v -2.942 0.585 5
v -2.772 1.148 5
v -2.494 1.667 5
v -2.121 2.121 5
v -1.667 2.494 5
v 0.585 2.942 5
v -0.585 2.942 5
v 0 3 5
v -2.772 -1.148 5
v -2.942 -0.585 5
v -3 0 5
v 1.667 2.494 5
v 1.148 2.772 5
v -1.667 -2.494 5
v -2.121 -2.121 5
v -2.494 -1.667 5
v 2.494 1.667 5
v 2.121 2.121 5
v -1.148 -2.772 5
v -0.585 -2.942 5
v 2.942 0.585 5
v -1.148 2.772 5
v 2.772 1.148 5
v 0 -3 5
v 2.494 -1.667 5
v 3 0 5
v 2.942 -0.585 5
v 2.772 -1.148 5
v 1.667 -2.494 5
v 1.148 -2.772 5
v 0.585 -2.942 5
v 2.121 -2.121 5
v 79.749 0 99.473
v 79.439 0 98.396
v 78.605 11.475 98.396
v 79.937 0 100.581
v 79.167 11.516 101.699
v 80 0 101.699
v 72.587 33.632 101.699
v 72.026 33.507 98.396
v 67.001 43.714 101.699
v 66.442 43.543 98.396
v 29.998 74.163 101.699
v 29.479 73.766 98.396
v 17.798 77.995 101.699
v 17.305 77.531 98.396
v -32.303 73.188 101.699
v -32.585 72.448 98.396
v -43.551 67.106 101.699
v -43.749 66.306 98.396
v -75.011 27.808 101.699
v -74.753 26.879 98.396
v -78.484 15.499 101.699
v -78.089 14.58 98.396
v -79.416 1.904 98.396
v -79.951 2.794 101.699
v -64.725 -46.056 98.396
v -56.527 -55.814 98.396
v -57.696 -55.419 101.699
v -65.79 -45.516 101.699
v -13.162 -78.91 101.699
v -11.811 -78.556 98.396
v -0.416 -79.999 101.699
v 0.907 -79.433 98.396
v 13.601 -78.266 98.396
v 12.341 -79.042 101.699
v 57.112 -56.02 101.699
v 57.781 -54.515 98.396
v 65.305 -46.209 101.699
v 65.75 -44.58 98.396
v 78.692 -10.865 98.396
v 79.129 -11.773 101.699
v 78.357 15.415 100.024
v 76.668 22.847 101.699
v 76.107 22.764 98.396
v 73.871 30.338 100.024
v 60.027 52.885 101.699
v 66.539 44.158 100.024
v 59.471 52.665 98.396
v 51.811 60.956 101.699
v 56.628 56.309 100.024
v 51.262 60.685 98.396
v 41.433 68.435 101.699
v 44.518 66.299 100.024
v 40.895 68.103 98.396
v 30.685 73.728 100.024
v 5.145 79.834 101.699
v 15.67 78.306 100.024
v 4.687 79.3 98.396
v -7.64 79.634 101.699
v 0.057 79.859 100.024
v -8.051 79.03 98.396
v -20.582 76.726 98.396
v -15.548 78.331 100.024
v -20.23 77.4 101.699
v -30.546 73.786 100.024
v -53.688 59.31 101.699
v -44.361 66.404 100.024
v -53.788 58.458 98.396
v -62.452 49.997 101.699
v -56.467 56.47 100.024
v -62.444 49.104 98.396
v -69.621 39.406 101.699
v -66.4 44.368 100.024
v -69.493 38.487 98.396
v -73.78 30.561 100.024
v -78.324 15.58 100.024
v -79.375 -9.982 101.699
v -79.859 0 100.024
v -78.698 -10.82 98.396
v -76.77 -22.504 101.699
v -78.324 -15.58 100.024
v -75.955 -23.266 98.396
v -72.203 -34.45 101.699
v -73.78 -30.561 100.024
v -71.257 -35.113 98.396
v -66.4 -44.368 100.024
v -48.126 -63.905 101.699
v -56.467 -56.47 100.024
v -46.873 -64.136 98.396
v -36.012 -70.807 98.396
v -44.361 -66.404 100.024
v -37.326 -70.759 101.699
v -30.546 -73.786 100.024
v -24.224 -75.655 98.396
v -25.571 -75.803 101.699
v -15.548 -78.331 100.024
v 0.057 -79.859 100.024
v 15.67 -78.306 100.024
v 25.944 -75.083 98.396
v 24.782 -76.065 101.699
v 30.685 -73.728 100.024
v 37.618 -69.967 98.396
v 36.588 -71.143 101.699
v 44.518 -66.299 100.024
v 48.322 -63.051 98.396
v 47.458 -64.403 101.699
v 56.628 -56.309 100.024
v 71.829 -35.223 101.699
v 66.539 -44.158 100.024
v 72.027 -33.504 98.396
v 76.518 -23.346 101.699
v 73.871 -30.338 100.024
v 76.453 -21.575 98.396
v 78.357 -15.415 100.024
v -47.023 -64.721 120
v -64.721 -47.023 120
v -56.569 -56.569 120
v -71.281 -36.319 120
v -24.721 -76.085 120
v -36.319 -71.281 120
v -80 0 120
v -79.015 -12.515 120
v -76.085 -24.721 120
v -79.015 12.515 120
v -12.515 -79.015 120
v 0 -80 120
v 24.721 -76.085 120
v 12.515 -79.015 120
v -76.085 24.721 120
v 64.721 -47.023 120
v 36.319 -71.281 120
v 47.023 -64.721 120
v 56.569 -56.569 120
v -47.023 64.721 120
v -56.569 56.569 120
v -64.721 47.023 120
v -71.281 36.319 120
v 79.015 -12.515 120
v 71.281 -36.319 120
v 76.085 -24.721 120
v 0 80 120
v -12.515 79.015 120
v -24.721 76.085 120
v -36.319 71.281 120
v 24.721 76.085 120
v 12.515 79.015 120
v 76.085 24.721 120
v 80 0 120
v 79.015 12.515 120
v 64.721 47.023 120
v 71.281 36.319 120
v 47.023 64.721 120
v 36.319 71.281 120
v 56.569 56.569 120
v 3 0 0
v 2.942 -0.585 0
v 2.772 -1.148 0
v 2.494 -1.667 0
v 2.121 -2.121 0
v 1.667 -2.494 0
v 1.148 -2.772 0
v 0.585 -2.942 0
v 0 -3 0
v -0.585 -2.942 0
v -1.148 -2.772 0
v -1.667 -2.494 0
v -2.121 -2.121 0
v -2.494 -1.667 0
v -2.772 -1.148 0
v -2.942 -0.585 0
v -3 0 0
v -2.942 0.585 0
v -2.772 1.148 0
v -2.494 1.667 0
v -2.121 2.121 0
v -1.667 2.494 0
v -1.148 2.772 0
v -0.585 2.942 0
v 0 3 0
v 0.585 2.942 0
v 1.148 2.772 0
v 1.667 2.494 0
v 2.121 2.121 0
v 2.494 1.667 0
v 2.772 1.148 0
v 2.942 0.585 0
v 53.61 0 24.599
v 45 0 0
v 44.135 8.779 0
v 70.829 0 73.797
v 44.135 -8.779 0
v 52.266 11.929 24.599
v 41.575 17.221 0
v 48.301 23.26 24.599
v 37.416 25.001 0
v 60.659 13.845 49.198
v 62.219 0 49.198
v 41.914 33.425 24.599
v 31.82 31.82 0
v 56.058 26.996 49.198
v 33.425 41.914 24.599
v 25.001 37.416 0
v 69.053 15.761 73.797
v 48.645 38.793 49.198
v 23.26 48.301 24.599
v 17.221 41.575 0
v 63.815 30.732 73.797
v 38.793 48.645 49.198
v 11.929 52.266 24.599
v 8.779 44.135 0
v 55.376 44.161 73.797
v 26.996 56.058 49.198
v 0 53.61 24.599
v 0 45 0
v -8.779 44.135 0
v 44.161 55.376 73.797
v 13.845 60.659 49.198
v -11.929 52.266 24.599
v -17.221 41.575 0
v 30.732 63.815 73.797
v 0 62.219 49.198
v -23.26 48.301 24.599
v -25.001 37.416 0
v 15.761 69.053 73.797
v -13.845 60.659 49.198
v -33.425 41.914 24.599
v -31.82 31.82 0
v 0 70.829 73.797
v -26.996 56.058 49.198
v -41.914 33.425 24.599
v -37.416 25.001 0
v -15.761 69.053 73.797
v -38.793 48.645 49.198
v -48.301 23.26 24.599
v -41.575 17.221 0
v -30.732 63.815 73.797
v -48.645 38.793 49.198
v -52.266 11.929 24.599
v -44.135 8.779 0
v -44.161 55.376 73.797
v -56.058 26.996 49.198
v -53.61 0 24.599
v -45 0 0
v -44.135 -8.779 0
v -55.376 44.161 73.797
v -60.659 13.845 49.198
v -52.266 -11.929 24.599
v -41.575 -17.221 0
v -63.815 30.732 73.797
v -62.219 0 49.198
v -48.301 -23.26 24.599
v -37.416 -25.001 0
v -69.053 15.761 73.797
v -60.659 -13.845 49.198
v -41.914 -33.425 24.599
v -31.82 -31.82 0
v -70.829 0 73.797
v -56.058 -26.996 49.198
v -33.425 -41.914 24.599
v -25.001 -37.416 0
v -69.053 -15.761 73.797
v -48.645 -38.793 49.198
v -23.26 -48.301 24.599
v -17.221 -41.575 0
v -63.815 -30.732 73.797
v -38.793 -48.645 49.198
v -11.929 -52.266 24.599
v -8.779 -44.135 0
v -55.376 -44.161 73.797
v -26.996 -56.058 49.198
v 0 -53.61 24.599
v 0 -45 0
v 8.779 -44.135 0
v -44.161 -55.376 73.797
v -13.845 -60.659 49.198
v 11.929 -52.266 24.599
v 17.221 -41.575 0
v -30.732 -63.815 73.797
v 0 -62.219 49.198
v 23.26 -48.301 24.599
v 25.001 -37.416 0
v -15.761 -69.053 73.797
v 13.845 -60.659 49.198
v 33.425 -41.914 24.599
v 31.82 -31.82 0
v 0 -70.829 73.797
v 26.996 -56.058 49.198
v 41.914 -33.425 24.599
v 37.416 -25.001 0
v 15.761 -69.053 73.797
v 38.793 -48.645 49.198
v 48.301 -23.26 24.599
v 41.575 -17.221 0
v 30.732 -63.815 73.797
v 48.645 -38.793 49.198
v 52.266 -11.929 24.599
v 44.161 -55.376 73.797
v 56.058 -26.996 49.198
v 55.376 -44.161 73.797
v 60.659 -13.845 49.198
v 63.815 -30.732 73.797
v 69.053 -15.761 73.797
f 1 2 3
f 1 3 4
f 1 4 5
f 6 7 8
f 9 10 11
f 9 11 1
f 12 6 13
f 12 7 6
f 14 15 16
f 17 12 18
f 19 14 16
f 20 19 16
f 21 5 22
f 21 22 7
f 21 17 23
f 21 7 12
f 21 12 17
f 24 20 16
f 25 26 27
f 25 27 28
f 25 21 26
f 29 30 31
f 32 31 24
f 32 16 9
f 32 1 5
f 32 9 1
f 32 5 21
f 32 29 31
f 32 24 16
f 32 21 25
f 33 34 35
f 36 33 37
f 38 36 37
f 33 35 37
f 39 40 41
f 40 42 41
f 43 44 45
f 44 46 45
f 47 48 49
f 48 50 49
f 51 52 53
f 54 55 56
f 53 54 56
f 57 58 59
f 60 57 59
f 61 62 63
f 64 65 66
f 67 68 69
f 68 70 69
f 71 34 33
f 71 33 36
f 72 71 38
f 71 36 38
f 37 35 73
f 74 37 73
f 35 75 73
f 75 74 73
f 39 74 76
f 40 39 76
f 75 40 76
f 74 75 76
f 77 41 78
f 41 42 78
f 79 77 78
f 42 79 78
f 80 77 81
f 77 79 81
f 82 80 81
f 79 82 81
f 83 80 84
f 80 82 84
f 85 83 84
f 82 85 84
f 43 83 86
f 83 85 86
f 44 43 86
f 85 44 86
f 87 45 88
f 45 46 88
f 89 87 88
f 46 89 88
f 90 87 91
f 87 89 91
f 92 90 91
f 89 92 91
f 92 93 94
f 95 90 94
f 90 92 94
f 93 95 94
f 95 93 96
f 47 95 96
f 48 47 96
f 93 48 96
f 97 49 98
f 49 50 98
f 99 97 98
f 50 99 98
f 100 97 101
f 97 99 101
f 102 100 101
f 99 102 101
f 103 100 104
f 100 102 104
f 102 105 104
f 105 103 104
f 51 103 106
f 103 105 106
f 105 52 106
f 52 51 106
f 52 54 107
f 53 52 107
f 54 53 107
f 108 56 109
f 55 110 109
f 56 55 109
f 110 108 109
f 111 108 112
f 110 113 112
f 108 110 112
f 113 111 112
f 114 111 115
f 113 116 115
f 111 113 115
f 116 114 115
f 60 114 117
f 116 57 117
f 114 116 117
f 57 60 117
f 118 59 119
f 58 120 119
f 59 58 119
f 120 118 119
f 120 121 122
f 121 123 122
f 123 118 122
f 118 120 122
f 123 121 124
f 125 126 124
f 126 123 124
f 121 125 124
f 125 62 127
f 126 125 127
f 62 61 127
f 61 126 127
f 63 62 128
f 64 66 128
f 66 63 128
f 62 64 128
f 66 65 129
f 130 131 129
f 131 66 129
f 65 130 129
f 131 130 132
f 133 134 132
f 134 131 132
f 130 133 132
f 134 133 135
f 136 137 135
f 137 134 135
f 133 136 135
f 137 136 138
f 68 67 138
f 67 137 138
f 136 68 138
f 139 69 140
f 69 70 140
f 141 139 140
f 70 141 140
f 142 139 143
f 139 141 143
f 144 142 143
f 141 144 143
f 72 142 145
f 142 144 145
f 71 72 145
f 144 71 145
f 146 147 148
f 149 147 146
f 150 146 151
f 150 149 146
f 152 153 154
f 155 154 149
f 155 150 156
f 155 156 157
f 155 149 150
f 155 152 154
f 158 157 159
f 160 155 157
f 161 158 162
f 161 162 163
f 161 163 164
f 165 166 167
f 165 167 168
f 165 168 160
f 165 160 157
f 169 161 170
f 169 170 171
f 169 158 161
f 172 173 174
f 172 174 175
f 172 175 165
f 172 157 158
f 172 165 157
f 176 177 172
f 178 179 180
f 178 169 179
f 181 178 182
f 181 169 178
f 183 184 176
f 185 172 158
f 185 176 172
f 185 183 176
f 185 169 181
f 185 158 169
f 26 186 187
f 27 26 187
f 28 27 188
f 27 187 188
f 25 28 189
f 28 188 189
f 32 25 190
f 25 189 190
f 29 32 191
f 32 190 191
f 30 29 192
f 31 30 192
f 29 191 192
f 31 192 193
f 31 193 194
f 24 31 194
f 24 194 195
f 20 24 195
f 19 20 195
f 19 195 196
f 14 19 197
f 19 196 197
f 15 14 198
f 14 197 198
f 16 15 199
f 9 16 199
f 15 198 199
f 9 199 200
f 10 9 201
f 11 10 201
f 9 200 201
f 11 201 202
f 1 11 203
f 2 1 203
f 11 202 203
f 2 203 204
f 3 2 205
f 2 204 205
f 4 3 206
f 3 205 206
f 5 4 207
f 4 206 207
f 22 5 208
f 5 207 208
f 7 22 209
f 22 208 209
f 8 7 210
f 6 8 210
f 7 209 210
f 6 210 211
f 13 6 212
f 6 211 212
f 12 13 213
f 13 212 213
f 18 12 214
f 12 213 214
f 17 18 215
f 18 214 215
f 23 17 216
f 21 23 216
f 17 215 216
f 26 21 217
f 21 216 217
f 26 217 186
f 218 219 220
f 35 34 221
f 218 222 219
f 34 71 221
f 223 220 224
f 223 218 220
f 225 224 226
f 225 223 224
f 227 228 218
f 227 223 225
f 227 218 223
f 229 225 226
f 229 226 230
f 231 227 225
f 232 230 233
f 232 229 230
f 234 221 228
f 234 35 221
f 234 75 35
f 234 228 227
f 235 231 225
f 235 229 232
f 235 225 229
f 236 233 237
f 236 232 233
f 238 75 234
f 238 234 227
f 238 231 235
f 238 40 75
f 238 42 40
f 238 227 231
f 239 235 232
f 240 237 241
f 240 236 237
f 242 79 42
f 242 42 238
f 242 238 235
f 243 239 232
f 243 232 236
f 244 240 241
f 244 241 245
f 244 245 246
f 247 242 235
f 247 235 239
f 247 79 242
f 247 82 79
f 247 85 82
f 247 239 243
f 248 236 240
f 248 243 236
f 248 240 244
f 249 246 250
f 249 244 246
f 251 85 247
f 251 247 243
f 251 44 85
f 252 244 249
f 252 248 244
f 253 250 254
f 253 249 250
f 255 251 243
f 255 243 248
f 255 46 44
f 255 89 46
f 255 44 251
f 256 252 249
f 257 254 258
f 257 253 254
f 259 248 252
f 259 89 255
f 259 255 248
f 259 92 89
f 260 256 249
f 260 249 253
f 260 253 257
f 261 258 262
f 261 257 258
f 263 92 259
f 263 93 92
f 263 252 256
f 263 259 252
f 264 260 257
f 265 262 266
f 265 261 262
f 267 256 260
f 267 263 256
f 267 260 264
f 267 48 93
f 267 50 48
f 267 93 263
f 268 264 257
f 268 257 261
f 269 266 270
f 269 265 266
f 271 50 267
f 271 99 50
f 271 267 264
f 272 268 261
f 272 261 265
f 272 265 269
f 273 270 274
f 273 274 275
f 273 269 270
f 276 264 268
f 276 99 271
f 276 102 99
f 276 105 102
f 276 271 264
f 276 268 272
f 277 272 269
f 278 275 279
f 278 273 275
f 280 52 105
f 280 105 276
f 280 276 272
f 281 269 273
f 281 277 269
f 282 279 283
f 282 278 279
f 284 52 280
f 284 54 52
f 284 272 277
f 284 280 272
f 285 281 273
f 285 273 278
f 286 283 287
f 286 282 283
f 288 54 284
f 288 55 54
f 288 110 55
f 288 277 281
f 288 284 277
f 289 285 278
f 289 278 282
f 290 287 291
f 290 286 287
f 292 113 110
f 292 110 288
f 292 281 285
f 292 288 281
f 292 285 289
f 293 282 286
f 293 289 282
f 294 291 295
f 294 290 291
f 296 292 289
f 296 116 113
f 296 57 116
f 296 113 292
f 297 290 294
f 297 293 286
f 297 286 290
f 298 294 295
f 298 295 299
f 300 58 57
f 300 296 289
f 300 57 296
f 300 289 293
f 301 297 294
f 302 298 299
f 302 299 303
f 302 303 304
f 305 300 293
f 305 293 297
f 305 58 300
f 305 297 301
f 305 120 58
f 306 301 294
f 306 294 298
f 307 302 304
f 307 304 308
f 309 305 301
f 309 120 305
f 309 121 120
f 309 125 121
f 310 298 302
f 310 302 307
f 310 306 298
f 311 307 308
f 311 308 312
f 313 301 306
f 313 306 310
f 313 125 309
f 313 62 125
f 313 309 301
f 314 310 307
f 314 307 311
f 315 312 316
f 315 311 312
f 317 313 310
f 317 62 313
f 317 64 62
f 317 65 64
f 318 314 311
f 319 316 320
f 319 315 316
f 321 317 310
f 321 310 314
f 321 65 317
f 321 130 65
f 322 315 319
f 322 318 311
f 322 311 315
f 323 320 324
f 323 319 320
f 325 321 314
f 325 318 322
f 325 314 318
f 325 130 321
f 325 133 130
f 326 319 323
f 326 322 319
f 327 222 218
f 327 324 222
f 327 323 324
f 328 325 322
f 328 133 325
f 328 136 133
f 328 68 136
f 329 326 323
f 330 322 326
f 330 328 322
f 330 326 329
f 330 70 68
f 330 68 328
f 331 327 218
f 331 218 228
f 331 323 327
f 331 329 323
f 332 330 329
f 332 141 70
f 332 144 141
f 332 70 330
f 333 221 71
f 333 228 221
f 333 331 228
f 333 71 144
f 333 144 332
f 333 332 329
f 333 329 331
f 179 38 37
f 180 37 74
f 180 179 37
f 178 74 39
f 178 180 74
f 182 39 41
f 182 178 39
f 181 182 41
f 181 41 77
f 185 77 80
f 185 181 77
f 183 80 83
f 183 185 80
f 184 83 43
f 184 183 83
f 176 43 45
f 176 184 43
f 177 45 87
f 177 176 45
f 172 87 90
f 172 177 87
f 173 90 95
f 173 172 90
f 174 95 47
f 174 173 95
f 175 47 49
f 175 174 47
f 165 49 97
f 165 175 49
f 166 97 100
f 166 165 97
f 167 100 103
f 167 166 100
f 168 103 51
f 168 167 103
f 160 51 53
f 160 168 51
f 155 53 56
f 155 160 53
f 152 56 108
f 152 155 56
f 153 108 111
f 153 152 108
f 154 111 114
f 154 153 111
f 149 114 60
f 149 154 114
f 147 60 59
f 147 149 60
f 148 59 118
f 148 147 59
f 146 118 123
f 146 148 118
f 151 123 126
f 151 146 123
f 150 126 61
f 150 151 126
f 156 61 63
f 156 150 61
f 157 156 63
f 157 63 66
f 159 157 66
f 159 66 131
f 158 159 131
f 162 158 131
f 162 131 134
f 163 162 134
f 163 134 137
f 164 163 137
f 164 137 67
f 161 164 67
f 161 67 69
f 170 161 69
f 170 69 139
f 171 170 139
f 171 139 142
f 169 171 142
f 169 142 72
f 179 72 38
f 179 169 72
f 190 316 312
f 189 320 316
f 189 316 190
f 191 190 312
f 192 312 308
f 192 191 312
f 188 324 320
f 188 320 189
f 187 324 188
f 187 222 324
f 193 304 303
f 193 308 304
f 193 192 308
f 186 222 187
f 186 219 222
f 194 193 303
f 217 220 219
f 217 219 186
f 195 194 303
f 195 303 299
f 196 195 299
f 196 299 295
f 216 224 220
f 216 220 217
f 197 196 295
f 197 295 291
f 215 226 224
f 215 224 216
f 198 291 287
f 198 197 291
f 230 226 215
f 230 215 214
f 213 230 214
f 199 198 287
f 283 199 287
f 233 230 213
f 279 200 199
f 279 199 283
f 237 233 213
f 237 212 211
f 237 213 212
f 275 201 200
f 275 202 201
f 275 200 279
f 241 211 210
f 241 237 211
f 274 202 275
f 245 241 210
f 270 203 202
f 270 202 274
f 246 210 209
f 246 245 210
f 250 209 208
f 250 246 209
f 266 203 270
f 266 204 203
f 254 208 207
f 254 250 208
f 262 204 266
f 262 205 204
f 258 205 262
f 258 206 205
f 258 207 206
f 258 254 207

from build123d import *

# Parameters (mm, degrees)
F2_R     = 3
F3_DEPTH = 5
F4_R     = 10


with BuildPart() as f1:
    # F0 (on Front) → F1 (revolve)
    with BuildSketch(Plane.XZ):
        Polygon((0, 120), (0, 0), (45, 0), (80, 100), (80, 120), align=None)
    revolve(axis=Axis((0, 0, 170.90906), (0, 0, 1)))

    # F2 (on face) → F3 (cut)
    with BuildSketch(Plane(origin=(0, 0, 0), x_dir=(1, 0, 0), z_dir=(0, 0, -1))):
        Circle(F2_R)
    extrude(amount=-F3_DEPTH, mode=Mode.SUBTRACT)

    # F4
    f4_edges = [f1.edges().sort_by_distance(p)[0] for p in [
        (-80, 0, 100),
    ]]
    fillet(f4_edges, radius=F4_R)


solid = f1.part
